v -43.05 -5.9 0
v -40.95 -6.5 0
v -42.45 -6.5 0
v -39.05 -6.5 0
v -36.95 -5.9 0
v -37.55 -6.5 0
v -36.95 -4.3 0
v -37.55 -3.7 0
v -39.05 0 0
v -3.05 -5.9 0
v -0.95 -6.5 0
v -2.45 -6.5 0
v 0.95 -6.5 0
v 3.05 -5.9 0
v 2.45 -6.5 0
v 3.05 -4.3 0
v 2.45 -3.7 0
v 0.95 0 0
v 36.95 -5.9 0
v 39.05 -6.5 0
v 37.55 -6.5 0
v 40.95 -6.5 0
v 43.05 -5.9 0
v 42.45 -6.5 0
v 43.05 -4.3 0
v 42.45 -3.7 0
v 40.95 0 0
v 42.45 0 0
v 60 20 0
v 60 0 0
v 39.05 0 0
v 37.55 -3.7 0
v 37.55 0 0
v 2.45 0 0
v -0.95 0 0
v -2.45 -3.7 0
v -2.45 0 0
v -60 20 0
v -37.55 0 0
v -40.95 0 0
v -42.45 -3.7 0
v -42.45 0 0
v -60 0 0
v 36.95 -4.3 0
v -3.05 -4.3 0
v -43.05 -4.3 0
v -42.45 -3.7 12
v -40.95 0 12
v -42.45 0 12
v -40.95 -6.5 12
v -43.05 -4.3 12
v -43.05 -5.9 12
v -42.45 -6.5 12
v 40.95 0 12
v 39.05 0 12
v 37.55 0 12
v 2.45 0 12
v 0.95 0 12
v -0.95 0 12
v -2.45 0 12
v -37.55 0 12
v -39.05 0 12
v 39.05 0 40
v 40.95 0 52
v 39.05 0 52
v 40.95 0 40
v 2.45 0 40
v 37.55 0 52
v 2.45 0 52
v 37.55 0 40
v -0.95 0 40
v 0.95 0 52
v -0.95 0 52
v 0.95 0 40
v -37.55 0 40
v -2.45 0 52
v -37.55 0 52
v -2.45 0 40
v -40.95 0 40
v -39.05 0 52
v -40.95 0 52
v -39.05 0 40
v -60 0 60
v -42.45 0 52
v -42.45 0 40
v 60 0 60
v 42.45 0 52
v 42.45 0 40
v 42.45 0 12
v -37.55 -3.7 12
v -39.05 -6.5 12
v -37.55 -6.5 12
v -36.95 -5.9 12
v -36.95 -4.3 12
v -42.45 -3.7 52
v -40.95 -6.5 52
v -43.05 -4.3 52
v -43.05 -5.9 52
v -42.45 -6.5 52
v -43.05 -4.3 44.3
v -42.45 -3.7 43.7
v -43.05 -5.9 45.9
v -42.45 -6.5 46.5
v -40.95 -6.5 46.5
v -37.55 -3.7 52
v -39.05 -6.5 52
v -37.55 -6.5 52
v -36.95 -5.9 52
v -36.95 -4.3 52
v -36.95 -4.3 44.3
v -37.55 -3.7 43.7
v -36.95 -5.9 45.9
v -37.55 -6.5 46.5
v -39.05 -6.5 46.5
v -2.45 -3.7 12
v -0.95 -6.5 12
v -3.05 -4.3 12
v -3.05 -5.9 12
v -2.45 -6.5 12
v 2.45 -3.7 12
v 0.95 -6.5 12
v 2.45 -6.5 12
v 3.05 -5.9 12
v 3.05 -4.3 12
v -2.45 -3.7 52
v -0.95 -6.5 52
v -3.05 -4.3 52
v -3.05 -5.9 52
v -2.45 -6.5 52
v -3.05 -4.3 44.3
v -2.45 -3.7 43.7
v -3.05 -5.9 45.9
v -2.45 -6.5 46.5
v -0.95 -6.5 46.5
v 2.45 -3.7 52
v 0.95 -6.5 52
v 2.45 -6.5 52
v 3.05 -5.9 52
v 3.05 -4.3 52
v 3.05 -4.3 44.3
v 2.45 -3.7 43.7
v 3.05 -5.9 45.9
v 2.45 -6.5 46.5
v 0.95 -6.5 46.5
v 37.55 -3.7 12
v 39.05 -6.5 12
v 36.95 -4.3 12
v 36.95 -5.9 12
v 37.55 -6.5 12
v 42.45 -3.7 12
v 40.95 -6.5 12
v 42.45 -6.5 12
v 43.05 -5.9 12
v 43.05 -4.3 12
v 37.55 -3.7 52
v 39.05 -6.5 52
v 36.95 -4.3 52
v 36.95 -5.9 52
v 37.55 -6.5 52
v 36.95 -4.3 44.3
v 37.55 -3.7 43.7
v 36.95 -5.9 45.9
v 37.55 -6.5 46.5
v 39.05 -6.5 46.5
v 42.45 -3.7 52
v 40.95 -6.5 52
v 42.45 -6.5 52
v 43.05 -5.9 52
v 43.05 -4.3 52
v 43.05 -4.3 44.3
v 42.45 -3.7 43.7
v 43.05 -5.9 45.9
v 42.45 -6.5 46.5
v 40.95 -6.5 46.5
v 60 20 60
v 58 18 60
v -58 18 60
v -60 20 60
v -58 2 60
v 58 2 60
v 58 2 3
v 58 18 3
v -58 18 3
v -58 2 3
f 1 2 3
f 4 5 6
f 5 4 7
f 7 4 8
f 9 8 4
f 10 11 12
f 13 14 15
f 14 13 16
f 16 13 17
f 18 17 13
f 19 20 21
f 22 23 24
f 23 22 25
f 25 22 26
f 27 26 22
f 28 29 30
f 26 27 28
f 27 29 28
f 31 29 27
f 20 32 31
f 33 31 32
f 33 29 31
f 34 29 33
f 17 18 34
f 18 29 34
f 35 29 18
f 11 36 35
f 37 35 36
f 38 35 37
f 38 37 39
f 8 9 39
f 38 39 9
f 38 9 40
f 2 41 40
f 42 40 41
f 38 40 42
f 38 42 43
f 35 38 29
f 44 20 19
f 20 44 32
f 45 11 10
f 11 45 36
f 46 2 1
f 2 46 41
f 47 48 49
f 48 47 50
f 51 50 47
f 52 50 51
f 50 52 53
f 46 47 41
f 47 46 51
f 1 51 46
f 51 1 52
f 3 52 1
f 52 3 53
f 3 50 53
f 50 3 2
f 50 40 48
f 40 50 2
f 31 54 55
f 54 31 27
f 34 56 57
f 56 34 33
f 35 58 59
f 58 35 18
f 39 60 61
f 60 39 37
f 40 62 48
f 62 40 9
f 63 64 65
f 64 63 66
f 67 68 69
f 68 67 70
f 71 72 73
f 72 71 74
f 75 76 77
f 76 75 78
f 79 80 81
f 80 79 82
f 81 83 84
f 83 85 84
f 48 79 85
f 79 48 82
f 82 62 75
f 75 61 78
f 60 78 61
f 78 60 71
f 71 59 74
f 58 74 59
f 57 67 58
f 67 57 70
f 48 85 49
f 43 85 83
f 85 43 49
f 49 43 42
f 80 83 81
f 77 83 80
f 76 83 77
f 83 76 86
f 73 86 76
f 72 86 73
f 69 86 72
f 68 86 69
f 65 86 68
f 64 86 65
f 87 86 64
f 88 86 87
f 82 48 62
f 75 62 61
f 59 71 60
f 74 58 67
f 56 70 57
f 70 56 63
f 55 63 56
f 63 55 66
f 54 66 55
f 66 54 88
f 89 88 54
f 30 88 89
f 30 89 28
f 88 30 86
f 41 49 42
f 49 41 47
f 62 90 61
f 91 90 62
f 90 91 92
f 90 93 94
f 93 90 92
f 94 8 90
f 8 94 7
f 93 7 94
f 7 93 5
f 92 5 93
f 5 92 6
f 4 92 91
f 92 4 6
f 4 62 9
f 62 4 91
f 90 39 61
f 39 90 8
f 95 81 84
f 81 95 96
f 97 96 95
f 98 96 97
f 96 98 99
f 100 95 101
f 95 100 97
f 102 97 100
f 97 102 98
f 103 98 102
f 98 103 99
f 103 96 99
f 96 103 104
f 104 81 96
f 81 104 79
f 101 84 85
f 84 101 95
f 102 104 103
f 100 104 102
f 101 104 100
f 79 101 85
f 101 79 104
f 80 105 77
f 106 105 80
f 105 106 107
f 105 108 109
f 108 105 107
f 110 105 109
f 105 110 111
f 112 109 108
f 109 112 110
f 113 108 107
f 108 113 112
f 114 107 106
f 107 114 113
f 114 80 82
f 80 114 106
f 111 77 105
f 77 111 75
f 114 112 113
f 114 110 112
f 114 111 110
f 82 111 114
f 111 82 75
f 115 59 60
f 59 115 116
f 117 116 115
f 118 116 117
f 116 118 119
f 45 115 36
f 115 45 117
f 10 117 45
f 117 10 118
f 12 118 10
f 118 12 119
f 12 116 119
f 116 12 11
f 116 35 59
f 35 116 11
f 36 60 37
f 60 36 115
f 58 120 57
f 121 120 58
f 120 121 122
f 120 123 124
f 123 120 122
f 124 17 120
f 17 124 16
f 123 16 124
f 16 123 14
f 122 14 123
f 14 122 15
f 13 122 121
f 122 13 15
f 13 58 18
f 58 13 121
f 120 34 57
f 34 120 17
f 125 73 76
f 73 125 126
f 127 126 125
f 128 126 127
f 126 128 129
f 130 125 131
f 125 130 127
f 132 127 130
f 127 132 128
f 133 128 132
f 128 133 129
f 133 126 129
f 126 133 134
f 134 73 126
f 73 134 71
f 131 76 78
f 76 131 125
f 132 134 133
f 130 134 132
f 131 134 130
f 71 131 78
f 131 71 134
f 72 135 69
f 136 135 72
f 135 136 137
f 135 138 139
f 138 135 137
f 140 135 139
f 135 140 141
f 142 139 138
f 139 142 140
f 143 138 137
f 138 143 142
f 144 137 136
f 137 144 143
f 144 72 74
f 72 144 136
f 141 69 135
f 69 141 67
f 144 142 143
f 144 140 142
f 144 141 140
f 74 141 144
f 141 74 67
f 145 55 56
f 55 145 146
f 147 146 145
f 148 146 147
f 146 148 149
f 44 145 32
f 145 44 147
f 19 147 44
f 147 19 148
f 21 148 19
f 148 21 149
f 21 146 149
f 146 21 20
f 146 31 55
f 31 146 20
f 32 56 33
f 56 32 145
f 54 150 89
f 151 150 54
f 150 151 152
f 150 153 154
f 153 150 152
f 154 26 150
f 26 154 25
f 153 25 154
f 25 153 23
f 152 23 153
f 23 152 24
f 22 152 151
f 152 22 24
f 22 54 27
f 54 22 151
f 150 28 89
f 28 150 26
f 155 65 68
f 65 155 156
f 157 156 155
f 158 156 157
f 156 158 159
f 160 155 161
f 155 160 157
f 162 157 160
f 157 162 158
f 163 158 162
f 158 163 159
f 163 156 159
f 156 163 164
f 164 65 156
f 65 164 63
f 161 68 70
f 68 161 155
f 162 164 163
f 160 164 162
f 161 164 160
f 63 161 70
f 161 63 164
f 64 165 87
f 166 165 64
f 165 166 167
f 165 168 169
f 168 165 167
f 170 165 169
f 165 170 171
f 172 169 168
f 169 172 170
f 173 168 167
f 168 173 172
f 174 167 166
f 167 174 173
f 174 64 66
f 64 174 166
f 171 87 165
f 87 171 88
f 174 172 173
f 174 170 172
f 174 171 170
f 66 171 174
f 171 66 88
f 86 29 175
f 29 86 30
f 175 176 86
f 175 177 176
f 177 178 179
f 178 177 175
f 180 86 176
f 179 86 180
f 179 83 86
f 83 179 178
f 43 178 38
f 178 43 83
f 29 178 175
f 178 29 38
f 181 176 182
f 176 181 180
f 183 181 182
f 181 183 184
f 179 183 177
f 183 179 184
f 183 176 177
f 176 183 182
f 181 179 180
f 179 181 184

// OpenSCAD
/* [Box Size] */
width = 120;
height = 60;
depth = 20;

/* [Hidden] */
plate_thickness = 0; 
clip_height     = 12;
gap_x           = 40;
gap_z           = 40;
padding_x       = 5;
HS              = 1000;

/* [Fillet] */
wall_fillet_radius = 0; // set > 0 to enable wall fillet

/* [Text] */
front_text = "";                             // text content; leave empty to disable
front_text_embossed = false;                  // false = engraved, true = embossed
front_text_size = 12;                         // font size in mm
front_text_depth = 1.0;                       // emboss/engrave depth in mm (along Y)
front_text_font = "Liberation Sans:style=Bold"; // OpenSCAD font spec
front_text_halign = "center";               // left | center | right
front_text_valign = "center";               // top | center | baseline | bottom
front_text_spacing = 1.0;                    // letter spacing multiplier
front_text_rotation = 0;                      // rotation in degrees within the face plane
front_text_offset_x = 0;                      // offset along X on the front face (mm)
front_text_offset_z = 0;                      // offset along Z on the front face (mm)
// Chamfer/taper for support-free text: 1.0 = no taper, smaller = more taper
front_text_taper_enable = true;
front_text_taper_ratio  = 0.9;                // 0.1..1.0; used as scale for both embossed and engraved

module skadis_box(width=120, height=160, depth=60, wall=2, bottom=3, fillet_radius=0) {
  back_plate_with_clips(width=width, height=height);
  front_box_on_plate(width=width, height=height, depth=depth, wall=wall, bottom=bottom, fillet_radius=fillet_radius);
}

module back_plate_with_clips(width, height) {
  translate([-width/2, -plate_thickness/2, 0])
    cube([width, plate_thickness, height]);

  W  = max(0, width - 2*padding_x);
  N  = max(1, floor(W/gap_x + 1));
  dx = -((N - 1)/2) * gap_x;

  H  = max(0, height - clip_height);
  NV = max(1, floor(H/gap_z + 1));

  for (i = [0 : N-1]) {
    for (j = [0 : NV-1]) {
      translate([dx + i*gap_x, -plate_thickness/2, j*gap_z])
        clip_pair(chamfer = (j > 0));
    }
  }
}

module clip_pair(chamfer=false) {
  union() {
    clip_single(chamfer=chamfer);                 
    mirror([1,0,0]) clip_single(chamfer=chamfer); 
  }
}

module clip_single(chamfer=false) {
  module clip_body() {
    linear_extrude(height=clip_height)
      rotate([0,0,180]) clip_profile();
  }

  if (chamfer) {
    difference() {
      clip_body();
      rotate([45, 0, 0])
        translate([-HS/2, -HS, -HS/2])
          cube([HS, HS, HS], center=false);
    }
  } else {
    clip_body();
  }
}

module clip_profile() {
  polygon(points=[
    [0.95, 0],
    [2.45, 0],
    [2.45, 3.7],
    [3.05, 4.3],
    [3.05, 5.9],
    [2.45, 6.5],
    [0.95, 6.5],
    [0.95, 0]
  ]);
}

// 2D rounded rectangle helper using offset for rounded joins
module rounded_rect_2d(w, d, r) {
  // Ensure non-negative radius and feasible dimensions
  rr = max(0, r);
  // Round corners by expanding and shrinking the rectangle footprint
  offset(r=rr) offset(delta=-rr) square([w, d], center=false);
}

// Generate 3D text positioned on the front face; embossed controls orientation and additional flip
module front_text_shape(width, height, depth, is_embossed=false) {
  has_text = (len(front_text) > 0);
  if (has_text) {
    y_front = plate_thickness/2 + depth;
    eps = 0.02;

    // Determine taper scale for support-friendly sides
    taper_raw = front_text_taper_ratio;
    taper_clamped = min(1, max(0.1, taper_raw));
    scale_engrave = front_text_taper_enable ? taper_clamped : 1;
    scale_emboss  = front_text_taper_enable ? taper_clamped : 1;

    if (is_embossed) {
      // Emboss: start just outside the front face and extrude inward (net union creates outside bump)
      translate([front_text_offset_x, y_front + eps, (height/2) + front_text_offset_z])
        // Rotate 180° around X as requested; total 270° to keep front-face orientation while flipping glyph
        rotate([270, 0, 0])
          linear_extrude(height=front_text_depth, scale=scale_emboss)
            rotate([180, 180, front_text_rotation])
              text(front_text, size=front_text_size, font=front_text_font, halign=front_text_halign, valign=front_text_valign, spacing=front_text_spacing);
    } else {
      // Engrave: start slightly outside and cut inward (-Y) so it is visible on the surface
      translate([front_text_offset_x, y_front + eps, (height/2) + front_text_offset_z])
        rotate([90, 0, 0])
          linear_extrude(height=front_text_depth, scale=scale_engrave)
            rotate([0, 180, front_text_rotation])
              text(front_text, size=front_text_size, font=front_text_font, halign=front_text_halign, valign=front_text_valign, spacing=front_text_spacing);
    }
  }
}

module front_box_on_plate(width, height, depth, wall=2, bottom=3, fillet_radius=0) {
  fr = max(0, fillet_radius);

  // Base box geometry (hollow), independent of text treatment
  module base_box() {
    if (fr <= 0) {
      difference() {
        translate([-width/2, plate_thickness/2, 0])
          cube([width, depth, height]);

        translate([-(width/2) + wall, plate_thickness/2 + wall, bottom])
          cube([width - 2*wall, depth - 2*wall, height - bottom]);
      }
    } else {
      // Use 2D rounded rectangle extruded along Z to form the box with filleted walls
      difference() {
        // Outer shell
        translate([-width/2, plate_thickness/2, 0])
          linear_extrude(height=height)
            rounded_rect_2d(width, depth, fr);

        // Inner cavity: offset inward by wall to maintain thickness around corners, preserve bottom
        translate([-width/2, plate_thickness/2, bottom])
          linear_extrude(height=height - bottom)
            offset(delta=-wall)
              rounded_rect_2d(width, depth, fr);
      }
    }
  }

  // Apply text as engraved or embossed on the front face
  has_text = (len(front_text) > 0);
  if (has_text && !front_text_embossed) {
    difference() {
      base_box();
      front_text_shape(width, height, depth, is_embossed=false);
    }
  } else if (has_text && front_text_embossed) {
    union() {
      base_box();
      front_text_shape(width, height, depth, is_embossed=true);
    }
  } else {
    base_box();
  }
}

skadis_box(width=width, height=height, depth=depth, fillet_radius=wall_fillet_radius);
